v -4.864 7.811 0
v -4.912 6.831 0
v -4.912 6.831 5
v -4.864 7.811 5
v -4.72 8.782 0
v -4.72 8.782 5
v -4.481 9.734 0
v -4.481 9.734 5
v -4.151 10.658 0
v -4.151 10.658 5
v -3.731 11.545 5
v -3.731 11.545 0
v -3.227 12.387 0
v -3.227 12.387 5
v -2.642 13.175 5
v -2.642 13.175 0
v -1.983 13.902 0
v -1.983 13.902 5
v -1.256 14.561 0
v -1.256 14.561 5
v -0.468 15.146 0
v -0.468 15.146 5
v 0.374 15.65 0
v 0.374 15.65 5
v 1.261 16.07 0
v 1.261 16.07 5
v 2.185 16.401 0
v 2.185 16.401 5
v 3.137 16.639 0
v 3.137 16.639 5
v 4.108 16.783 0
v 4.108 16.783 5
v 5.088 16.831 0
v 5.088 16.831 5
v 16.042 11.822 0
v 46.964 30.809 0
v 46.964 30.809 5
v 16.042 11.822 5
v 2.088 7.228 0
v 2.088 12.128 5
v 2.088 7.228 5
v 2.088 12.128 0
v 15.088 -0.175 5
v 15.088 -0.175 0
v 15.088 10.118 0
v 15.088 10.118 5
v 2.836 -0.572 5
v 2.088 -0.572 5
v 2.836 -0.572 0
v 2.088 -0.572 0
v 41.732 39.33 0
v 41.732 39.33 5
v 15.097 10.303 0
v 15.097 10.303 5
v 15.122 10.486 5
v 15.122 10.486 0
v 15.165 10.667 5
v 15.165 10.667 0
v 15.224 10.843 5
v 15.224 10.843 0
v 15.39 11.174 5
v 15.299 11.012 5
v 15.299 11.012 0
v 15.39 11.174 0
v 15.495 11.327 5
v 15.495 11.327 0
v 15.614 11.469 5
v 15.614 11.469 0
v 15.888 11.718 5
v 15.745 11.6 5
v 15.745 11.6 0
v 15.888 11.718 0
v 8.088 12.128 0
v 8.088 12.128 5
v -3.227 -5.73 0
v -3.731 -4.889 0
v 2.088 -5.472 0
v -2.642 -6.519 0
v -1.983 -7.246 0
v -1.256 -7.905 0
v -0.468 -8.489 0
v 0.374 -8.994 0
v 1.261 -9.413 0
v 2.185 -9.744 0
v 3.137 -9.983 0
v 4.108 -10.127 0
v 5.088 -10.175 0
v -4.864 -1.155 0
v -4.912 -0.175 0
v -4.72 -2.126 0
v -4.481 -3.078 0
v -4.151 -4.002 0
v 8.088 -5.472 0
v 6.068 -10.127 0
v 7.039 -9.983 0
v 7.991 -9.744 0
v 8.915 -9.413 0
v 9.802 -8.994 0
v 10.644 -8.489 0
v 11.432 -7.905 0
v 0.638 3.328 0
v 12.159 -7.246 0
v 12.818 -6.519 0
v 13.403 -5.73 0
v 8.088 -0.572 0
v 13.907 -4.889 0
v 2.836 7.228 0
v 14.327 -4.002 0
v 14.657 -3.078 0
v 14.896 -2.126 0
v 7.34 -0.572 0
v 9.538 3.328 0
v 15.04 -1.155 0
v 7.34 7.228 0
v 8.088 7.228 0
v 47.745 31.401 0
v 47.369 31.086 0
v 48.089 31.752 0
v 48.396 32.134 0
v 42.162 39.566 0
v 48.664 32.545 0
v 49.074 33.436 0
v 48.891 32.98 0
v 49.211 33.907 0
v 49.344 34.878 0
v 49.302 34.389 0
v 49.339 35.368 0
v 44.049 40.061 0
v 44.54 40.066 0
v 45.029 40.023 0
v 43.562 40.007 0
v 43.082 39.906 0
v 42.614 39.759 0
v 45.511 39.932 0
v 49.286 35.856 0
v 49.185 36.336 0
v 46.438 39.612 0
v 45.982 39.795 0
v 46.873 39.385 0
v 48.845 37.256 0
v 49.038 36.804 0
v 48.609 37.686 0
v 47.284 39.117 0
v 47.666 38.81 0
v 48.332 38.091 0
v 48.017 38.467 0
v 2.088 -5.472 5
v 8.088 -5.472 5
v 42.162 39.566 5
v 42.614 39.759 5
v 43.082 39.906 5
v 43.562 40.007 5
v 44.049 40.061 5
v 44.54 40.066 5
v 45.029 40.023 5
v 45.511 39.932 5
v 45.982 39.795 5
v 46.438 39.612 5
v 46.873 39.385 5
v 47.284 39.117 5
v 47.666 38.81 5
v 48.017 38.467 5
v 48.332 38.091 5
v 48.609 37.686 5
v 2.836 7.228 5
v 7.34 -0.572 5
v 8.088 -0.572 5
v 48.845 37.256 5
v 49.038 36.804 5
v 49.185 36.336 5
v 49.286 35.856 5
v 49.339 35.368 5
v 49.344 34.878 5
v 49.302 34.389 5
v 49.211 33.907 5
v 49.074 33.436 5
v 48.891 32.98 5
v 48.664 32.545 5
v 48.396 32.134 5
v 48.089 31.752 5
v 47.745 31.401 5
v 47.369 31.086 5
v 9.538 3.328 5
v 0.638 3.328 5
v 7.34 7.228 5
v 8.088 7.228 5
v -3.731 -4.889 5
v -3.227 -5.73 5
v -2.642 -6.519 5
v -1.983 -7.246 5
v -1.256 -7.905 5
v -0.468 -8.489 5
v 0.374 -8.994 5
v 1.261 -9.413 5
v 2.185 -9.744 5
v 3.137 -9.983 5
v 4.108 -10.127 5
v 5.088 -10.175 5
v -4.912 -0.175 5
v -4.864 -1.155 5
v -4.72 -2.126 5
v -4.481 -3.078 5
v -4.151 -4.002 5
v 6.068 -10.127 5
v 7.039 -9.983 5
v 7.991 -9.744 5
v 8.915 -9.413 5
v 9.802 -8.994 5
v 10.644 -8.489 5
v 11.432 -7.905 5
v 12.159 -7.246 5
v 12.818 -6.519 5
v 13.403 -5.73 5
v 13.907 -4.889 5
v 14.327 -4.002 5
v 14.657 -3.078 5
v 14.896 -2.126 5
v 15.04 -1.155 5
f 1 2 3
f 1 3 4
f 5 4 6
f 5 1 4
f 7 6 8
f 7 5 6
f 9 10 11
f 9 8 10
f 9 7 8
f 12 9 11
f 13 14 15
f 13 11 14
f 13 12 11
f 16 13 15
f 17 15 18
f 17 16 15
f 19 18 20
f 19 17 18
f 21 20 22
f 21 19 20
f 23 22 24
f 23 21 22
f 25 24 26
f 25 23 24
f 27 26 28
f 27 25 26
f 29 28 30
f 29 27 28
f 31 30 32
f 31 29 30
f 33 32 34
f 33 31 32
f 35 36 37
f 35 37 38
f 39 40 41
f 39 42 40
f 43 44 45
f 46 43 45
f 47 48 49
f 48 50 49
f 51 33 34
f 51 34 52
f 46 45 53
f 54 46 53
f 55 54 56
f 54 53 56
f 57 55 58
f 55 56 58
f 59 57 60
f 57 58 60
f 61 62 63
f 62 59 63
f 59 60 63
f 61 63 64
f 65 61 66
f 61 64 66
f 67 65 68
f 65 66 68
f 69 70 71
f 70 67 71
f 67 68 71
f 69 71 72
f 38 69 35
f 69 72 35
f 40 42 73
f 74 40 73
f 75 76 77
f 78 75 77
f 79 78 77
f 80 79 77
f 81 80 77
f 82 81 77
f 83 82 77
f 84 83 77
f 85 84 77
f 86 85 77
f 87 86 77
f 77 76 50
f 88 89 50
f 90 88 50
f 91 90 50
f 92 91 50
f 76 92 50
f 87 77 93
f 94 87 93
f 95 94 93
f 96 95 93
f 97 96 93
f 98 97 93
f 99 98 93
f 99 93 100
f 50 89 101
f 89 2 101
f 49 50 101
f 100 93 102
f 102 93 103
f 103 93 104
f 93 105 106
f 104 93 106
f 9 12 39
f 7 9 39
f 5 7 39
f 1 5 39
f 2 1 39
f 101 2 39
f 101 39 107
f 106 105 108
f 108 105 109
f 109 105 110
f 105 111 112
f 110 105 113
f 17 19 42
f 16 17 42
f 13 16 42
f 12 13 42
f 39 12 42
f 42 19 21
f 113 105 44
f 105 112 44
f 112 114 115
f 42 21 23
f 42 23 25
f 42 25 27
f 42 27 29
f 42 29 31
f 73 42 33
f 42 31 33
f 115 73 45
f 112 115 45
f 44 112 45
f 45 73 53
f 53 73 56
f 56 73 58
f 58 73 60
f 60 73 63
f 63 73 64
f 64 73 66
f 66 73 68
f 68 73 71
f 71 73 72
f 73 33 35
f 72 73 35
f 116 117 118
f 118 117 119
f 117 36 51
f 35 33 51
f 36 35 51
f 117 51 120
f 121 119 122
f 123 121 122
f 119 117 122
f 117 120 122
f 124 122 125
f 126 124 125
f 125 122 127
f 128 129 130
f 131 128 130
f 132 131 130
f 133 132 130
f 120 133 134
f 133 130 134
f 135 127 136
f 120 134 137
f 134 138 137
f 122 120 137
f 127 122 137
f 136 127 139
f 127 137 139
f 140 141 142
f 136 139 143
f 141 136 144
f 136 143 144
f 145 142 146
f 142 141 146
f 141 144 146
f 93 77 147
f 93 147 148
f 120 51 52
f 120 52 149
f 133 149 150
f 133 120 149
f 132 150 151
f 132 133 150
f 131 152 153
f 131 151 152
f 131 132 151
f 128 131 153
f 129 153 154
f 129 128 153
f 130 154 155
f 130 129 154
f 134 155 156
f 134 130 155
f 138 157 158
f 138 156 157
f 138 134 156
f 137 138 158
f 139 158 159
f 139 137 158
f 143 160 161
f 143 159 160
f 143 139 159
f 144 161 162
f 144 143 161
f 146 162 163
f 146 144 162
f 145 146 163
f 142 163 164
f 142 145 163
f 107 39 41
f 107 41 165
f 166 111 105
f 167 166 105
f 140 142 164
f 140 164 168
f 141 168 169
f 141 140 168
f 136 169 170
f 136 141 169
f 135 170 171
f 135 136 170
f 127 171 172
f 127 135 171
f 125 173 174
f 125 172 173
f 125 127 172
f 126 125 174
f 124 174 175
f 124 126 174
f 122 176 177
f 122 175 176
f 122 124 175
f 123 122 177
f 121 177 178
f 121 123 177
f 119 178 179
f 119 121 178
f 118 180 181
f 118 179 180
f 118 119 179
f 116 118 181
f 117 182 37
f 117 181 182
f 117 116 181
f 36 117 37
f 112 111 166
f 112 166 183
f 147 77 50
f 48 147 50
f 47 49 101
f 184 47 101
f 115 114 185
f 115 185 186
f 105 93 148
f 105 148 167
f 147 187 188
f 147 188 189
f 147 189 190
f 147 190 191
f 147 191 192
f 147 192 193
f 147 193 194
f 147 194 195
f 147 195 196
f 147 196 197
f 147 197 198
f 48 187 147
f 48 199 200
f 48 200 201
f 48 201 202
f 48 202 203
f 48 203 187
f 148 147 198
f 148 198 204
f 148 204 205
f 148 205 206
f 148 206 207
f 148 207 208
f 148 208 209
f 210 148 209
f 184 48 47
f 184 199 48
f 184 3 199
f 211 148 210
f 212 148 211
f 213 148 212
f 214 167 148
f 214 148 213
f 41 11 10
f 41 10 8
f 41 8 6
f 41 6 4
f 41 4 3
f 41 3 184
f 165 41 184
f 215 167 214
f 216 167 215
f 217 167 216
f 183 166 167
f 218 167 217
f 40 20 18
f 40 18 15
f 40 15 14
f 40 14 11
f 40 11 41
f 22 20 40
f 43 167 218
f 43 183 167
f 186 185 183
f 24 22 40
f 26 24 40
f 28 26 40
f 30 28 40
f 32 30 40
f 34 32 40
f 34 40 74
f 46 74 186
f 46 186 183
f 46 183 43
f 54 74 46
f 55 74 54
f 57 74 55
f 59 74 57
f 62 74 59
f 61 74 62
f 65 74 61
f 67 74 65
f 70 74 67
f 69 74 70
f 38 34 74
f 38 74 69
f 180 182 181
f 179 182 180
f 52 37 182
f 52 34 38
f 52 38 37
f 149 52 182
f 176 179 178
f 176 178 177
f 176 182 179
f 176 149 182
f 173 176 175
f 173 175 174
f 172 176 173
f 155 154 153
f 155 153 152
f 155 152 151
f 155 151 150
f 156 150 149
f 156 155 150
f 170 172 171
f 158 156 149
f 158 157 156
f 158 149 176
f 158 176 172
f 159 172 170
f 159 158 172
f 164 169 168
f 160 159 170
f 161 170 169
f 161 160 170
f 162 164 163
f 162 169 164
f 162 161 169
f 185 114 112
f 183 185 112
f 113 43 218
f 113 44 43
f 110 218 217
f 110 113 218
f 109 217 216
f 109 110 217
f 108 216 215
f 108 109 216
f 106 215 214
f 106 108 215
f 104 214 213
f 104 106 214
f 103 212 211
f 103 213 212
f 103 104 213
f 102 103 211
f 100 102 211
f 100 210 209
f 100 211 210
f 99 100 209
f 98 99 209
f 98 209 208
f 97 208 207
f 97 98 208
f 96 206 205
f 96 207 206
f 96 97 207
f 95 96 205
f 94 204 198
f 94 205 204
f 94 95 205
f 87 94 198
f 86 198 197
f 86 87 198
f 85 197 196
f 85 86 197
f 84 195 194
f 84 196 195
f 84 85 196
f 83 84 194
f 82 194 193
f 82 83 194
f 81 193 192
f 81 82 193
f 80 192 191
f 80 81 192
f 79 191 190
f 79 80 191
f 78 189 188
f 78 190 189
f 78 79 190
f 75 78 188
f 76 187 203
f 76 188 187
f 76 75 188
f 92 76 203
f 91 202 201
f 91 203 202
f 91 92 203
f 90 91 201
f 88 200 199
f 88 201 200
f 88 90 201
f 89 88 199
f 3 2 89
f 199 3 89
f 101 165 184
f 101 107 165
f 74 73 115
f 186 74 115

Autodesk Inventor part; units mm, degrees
ref_plane "YZ Plane" through (0, 0, 0) normal (1, 0, 0) x (0, 1, 0)
ref_plane "XZ Plane" through (0, 0, 0) normal (0, 1, 0) x (-1, 0, 0)
ref_plane "XY Plane" through (0, 0, 0) normal (0, 0, 1) x (1, 0, 0)
sketch "Эскиз1" plane through (0, 0, 0) normal (0, 0, 1) x (1, 0, 0)
  arc A0 (5.088, 16.8311) -> (-4.912, 6.8311) centre (5.088, 6.8311) ccw
  line L0 (7.3397, 7.2282) -> (8.088, 7.2282)
  line L1 (7.3397, 7.2282) -> (9.538, 3.3282)
  line L2 (2.8364, 7.2282) -> (0.638, 3.3282)
  line L3 (7.3397, -0.5718) -> (9.538, 3.3282)
  line L4 (2.8364, -0.5718) -> (0.638, 3.3282)
  line L5 (2.088, 12.1282) -> (8.088, 12.1282)
  line L6 (8.088, 12.1282) -> (8.088, 7.2282)
  line L7 (2.088, 7.2282) -> (2.8364, 7.2282)
  line L8 (2.088, 12.1282) -> (2.088, 7.2282)
  line L9 (-4.912, 6.8311) -> (-4.912, -0.1747)
  arc A1 (-4.912, -0.1747) -> (15.088, -0.1747) centre (5.088, -0.1747) ccw
  line L10 (15.088, -0.1747) -> (15.088, 10.1176)
  line L11 (7.3397, -0.5718) -> (8.088, -0.5718)
  line L12 (2.088, -5.4718) -> (8.088, -5.4718)
  line L13 (8.088, -5.4718) -> (8.088, -0.5718)
  line L14 (2.088, -0.5718) -> (2.8364, -0.5718)
  line L15 (2.088, -5.4718) -> (2.088, -0.5718)
  line L16 (5.088, 16.8311) -> (41.732, 39.3305)
  line L17 (46.9644, 30.8087) -> (16.0416, 11.822)
  arc A2 (48.6091, 37.6858) -> (41.732, 39.3305) centre (44.3482, 35.0696) ccw
  arc A3 (46.9644, 30.8087) -> (48.6091, 37.6858) centre (44.3482, 35.0696) ccw
  arc A4 (16.0416, 11.822) -> (15.088, 10.1176) centre (17.088, 10.1176) ccw
  point P0 (5.088, 3.3282)
  point P1 (15.088, 11.2365)
extrude "Выдавливание1" add sketch "Эскиз1" along normal blind 5
properties part number "В. шарн. - держатель соединителя"
